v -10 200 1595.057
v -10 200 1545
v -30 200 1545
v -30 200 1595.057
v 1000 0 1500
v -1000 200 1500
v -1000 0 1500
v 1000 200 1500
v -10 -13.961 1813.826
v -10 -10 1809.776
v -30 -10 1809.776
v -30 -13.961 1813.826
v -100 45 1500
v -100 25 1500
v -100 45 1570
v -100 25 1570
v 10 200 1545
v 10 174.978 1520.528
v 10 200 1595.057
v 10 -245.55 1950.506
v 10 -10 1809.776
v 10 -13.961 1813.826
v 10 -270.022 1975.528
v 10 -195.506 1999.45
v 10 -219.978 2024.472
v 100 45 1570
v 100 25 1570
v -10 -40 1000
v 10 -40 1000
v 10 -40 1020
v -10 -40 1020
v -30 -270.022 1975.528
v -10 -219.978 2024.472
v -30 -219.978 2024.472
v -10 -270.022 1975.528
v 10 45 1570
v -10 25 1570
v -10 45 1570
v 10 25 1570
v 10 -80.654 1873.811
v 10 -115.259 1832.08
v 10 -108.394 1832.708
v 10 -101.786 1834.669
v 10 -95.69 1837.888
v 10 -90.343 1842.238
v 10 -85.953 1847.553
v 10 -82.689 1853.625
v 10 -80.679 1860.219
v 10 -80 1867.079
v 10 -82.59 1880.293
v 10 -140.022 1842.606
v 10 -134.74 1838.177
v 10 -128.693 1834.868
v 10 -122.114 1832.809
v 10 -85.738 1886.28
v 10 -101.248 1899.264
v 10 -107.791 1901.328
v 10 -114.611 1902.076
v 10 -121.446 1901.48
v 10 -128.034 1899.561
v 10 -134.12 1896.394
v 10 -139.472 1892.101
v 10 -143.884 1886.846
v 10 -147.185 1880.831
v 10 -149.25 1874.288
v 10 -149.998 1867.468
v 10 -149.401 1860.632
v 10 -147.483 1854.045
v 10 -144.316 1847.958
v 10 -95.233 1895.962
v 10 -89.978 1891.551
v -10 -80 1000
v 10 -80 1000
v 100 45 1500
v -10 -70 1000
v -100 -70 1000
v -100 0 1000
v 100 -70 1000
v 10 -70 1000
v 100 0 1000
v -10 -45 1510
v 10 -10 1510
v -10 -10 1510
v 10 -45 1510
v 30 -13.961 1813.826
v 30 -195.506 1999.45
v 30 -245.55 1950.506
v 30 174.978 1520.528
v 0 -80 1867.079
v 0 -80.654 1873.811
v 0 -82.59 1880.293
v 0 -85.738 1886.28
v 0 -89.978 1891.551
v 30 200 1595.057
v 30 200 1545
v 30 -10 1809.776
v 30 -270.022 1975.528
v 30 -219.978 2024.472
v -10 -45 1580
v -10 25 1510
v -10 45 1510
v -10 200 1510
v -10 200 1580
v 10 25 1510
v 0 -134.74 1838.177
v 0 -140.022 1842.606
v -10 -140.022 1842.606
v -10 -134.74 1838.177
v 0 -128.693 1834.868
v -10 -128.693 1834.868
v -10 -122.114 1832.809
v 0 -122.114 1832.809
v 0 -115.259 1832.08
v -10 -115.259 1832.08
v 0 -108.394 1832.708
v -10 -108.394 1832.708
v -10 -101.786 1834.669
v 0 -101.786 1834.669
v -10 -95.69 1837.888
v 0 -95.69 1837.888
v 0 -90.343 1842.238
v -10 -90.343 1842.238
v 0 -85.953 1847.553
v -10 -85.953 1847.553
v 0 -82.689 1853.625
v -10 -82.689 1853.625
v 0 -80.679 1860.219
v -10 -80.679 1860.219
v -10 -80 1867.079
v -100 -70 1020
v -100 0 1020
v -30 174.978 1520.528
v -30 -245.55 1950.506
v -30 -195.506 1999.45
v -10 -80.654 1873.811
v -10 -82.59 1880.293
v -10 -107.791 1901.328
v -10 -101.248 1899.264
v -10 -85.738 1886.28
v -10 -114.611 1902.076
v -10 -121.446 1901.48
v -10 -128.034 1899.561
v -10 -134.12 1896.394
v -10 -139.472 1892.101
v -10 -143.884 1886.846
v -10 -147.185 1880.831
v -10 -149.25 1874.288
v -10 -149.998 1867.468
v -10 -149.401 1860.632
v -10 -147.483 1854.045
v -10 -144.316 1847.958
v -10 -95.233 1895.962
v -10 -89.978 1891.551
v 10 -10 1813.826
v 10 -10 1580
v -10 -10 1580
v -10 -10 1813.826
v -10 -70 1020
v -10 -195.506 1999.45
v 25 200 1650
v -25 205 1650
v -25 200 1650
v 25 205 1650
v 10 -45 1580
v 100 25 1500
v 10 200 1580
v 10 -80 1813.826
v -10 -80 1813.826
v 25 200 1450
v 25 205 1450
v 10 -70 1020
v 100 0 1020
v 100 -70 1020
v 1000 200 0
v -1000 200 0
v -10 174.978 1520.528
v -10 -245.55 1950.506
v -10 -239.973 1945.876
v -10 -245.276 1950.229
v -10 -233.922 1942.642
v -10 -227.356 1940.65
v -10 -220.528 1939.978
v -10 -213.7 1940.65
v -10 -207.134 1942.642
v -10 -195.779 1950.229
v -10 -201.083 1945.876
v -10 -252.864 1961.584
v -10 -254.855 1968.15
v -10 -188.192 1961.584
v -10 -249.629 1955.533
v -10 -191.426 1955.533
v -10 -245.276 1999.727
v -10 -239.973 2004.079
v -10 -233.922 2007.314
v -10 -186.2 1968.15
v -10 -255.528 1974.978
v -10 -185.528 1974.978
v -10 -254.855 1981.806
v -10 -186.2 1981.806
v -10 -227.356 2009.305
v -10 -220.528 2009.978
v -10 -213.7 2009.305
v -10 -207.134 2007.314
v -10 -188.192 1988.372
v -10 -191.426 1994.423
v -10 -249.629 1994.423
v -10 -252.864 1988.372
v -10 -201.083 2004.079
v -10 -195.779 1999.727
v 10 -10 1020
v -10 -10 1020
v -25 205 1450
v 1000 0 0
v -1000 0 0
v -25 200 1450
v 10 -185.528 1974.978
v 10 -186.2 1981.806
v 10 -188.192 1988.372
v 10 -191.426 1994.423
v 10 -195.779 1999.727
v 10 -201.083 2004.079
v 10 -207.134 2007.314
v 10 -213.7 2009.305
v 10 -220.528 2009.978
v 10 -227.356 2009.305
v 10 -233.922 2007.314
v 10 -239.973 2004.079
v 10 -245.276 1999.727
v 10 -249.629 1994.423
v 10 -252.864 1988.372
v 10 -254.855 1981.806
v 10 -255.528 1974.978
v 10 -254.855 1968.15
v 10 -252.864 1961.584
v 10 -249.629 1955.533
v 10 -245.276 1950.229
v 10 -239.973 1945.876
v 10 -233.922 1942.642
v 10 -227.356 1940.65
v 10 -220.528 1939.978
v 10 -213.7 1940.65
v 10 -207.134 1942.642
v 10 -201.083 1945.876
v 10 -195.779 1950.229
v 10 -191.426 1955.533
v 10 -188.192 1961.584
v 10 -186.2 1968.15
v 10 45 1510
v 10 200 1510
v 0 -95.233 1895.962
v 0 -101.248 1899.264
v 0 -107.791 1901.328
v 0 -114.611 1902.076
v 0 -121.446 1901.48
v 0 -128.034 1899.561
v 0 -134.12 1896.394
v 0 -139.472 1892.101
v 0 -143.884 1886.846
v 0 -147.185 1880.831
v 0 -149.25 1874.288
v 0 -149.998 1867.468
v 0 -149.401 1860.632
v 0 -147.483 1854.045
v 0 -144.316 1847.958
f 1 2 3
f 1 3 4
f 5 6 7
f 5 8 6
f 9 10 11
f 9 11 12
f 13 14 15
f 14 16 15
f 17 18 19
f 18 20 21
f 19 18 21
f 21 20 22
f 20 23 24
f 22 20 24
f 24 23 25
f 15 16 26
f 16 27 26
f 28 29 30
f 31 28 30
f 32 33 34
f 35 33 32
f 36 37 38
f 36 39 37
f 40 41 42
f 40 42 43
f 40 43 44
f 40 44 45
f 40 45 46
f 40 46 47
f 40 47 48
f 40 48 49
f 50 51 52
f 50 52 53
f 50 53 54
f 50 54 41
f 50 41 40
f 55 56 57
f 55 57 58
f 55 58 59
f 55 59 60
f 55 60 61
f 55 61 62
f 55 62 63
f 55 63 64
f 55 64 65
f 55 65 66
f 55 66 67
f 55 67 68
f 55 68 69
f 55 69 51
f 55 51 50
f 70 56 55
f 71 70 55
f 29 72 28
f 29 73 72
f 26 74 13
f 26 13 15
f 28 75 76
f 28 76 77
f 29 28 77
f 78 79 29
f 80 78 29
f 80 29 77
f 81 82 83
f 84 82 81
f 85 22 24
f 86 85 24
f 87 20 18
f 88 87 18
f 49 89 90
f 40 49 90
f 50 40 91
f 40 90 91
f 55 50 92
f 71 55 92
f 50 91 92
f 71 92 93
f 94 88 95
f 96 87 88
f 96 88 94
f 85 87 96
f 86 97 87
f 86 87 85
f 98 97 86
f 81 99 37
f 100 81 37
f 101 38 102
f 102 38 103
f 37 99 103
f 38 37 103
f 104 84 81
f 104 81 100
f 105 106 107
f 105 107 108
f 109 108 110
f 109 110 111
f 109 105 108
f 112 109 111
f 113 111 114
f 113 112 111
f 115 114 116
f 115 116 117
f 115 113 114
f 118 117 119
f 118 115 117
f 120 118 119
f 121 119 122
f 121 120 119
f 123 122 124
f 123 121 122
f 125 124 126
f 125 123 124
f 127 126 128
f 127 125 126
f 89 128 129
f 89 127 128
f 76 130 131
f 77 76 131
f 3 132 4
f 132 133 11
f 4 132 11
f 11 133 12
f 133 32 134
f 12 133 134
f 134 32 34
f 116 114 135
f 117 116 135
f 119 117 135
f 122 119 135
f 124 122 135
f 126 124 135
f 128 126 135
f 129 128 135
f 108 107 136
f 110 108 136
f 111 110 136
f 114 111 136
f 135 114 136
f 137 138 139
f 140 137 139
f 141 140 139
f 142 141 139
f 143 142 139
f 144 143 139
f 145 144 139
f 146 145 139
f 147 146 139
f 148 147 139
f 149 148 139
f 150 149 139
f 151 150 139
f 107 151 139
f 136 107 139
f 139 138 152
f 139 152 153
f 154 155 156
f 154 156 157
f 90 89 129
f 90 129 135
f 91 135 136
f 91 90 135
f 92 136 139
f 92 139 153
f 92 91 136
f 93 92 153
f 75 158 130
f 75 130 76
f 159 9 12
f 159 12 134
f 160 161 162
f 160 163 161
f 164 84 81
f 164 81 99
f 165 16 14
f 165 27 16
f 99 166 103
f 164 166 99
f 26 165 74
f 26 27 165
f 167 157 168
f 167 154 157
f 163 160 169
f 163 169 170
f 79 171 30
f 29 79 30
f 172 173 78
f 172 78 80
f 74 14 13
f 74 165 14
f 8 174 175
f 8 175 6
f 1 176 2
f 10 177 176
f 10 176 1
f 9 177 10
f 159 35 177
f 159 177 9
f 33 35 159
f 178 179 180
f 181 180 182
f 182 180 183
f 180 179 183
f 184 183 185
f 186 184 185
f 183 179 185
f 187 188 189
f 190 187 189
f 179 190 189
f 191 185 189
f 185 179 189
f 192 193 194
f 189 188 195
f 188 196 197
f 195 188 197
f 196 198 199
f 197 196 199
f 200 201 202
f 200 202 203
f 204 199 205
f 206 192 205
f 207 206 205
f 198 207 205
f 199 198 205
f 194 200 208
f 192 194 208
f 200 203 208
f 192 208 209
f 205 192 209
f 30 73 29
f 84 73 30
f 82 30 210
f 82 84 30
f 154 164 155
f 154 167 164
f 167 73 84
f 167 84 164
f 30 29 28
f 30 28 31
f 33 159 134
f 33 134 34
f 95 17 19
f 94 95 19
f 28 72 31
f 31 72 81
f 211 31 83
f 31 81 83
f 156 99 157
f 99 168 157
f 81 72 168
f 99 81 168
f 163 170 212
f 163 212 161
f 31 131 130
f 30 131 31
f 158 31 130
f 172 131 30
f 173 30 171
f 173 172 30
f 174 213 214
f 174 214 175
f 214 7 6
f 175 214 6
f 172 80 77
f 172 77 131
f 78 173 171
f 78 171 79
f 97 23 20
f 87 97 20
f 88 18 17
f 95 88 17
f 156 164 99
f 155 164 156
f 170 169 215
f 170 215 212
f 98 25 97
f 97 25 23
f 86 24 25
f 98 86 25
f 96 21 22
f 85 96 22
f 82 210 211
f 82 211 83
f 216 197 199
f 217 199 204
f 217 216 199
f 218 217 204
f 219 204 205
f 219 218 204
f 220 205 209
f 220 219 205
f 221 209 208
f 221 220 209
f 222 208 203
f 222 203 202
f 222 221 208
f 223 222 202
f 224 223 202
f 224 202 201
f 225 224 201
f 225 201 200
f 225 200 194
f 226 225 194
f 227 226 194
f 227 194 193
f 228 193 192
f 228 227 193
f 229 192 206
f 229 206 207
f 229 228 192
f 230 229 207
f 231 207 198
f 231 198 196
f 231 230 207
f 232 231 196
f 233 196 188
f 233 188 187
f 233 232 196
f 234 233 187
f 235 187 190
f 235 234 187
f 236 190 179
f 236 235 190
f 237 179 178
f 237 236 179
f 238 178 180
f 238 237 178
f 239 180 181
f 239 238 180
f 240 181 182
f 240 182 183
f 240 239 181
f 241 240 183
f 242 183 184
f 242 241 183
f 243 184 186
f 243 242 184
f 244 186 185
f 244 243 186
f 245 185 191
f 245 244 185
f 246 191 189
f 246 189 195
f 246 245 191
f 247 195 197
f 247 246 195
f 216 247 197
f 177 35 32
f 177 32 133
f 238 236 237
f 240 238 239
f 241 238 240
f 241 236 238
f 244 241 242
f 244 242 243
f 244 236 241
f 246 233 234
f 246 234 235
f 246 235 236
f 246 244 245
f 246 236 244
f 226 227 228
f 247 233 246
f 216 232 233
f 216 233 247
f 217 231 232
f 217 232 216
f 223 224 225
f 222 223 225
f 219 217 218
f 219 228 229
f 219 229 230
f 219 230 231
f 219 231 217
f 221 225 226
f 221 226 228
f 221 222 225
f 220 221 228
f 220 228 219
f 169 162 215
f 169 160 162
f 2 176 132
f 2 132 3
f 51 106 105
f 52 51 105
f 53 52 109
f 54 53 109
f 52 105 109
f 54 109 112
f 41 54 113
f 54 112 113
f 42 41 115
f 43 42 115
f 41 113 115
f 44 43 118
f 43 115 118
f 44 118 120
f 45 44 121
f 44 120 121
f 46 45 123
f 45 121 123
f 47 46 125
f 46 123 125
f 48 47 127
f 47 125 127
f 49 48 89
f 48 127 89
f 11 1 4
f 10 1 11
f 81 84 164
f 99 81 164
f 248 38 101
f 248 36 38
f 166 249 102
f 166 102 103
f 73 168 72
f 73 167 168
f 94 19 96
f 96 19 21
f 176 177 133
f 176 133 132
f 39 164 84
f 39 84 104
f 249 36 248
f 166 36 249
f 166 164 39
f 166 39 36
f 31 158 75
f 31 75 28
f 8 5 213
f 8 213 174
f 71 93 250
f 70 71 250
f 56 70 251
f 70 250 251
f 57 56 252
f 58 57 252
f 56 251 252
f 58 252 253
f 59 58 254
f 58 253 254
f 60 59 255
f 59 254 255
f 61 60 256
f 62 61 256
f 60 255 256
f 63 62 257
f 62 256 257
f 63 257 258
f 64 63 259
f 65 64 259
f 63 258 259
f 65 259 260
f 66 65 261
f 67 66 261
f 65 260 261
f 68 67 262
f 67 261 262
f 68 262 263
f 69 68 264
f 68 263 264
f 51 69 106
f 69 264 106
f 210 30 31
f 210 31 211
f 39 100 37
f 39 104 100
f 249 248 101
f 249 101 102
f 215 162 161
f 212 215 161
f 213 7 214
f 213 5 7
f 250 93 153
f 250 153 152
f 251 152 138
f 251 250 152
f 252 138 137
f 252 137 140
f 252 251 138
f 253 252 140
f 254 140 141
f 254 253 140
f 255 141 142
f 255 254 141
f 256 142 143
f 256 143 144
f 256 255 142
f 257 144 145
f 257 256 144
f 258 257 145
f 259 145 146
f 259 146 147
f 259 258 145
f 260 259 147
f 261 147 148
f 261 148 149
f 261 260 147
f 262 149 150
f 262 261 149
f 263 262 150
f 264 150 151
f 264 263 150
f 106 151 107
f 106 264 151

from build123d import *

# Parameters (mm, degrees)
F3_DEPTH  = 1000
F4_START  = 10
F4_DEPTH  = 20
F6_DEPTH  = 10
F7_DEPTH  = 25
F2_W      = 20
F2_H      = 10
F2_W_2    = 35
F2_H_2    = 70
F8_DEPTH  = 10
F2_H_3    = 30
F9_DEPTH  = 100
F2_W_3    = 10
F2_H_4    = 20
F10_DEPTH = 100
F12_DEPTH = 10


with BuildPart() as f3:
    # F1 (on Right) → F3 (new body, symmetric)
    with BuildSketch(Plane.YZ):
        Polygon((0, 1500), (0, 0), (200, 0), (200, 1450), (200, 1500), align=None)
    extrude(amount=F3_DEPTH, both=True)


with BuildPart() as f4:
    # F2 (on Right) → F4 (new body)
    with BuildSketch(Plane.YZ.offset(F4_START)):
        with BuildLine():
            Line((-195.5055843756, 1999.4500660353), (-219.9778212193, 2024.4722407855))
            Line((-219.9778212193, 2024.4722407855), (-244.999999895, 2000.0000001027))
            ThreePointArc((-244.999999895, 2000.0000001027), (-220.138897074, 2009.975660956), (-195.5055843756, 1999.4500660353))
        make_face()
        with BuildLine():
            ThreePointArc((-245.5499385986, 1950.5055810507), (-255.525598915, 1975.3666866098), (-244.999999895, 2000.0000001027))
            Line((-244.999999895, 2000.0000001027), (-270.0221787807, 1975.5277592145))
            Line((-270.0221787807, 1975.5277592145), (-245.5499385986, 1950.5055810507))
        make_face()
        Polygon((-10, 1809.7758168422), (-13.9611338418, 1813.8259649277), (-80, 1813.8259649277), (-80, 1781.2354191128), (-10, 1709.662385405), align=None)
        Polygon((200, 1595.0567157186), (-10, 1809.7758168422), (-10, 1709.662385405), (116.8126626488, 1580), (200, 1580), align=None)
        Polygon((200, 1545), (200, 1580), (116.8126626488, 1580), (174.9778212193, 1520.5277592145), align=None)
        with BuildLine():
            ThreePointArc((-185.5277592145, 1974.9778212193), (-188.1180683847, 1988.1919023572), (-195.5055843756, 1999.4500660353))
            ThreePointArc((-195.5055843756, 1999.4500660353), (-220.138897074, 2009.975660956), (-244.999999895, 2000.0000001027))
            ThreePointArc((-244.999999895, 2000.0000001027), (-255.525598915, 1975.3666866098), (-245.5499385986, 1950.5055810507))
            ThreePointArc((-245.5499385986, 1950.5055810507), (-207.3136810863, 1942.5681291624), (-185.5277592145, 1974.9778212193))
        make_face()
        with BuildLine():
            Line((-89.9778251612, 1891.5508965014), (-195.5055843756, 1999.4500660353))
            ThreePointArc((-195.5055843756, 1999.4500660353), (-188.1180683847, 1988.1919023572), (-185.5277592145, 1974.9778212193))
            ThreePointArc((-185.5277592145, 1974.9778212193), (-207.3136810863, 1942.5681291624), (-245.5499385986, 1950.5055810507))
            Line((-245.5499385986, 1950.5055810507), (-140.0221796625, 1842.6064118015))
            ThreePointArc((-140.0221796625, 1842.6064118015), (-139.47224235, 1892.1008289361), (-89.9778251612, 1891.5508965014))
        make_face()
        with BuildLine():
            ThreePointArc((-80, 1867.0786516854), (-82.5903091703, 1880.2927328233), (-89.9778251612, 1891.5508965014))
            ThreePointArc((-89.9778251612, 1891.5508965014), (-139.47224235, 1892.1008289361), (-140.0221796625, 1842.6064118015))
            ThreePointArc((-140.0221796625, 1842.6064118015), (-101.7859220562, 1834.6689595533), (-80, 1867.0786516854))
        make_face()
        with BuildLine():
            Line((-13.9611338418, 1813.8259649277), (-89.9778251612, 1891.5508965014))
            ThreePointArc((-89.9778251612, 1891.5508965014), (-82.5903091703, 1880.2927328233), (-80, 1867.0786516854))
            ThreePointArc((-80, 1867.0786516854), (-101.7859220562, 1834.6689595533), (-140.0221796625, 1842.6064118015))
            Line((-140.0221796625, 1842.6064118015), (-80, 1781.2354191128))
            Line((-80, 1781.2354191128), (-80, 1813.8259649277))
            Line((-80, 1813.8259649277), (-13.9611338418, 1813.8259649277))
        make_face()
    extrude(amount=F4_DEPTH)


with BuildPart() as f5_1:
    # F5: instance of F4
    add(f4.part.mirror(Plane.YZ))


with BuildPart() as f6:
    # F2 (on Right) → F6 (new body, symmetric)
    with BuildSketch(Plane.YZ):
        Polygon((-10, 1709.662385405), (-80, 1781.2354191128), (-80, 1000), (-70, 1000), (-70, 1020), (-40, 1020), (-10, 1020), (-10, 1510), (-45, 1510), (-45, 1580), (-10, 1580), align=None)
        Polygon((-10, 1809.7758168422), (-13.9611338418, 1813.8259649277), (-80, 1813.8259649277), (-80, 1781.2354191128), (-10, 1709.662385405), align=None)
        Polygon((-70, 1020), (-70, 1000), (-40, 1000), (-40, 1010), (-40, 1020), align=None)
        Polygon((-10, 1813.8259649277), (-13.9611338418, 1813.8259649277), (-10, 1809.7758168422), align=None)
    extrude(amount=F6_DEPTH, both=True)


with BuildPart() as f7:
    # F1 (on Right) → F7 (new body, symmetric)
    with BuildSketch(Plane.YZ):
        Polygon((200, 1650), (200, 1500), (200, 1450), (205, 1450), (205, 1650), align=None)
    extrude(amount=F7_DEPTH, both=True)


with BuildPart() as f8:
    # F2 (on Right) → F8 (new body, symmetric)
    with BuildSketch(Plane.YZ):
        Polygon((174.9778212193, 1520.5277592145), (116.8126626488, 1580), (45, 1580), (45, 1570), (45, 1540), (45, 1510), (200, 1510), (200, 1545), align=None)
        Polygon((200, 1545), (200, 1580), (116.8126626488, 1580), (174.9778212193, 1520.5277592145), align=None)
        Polygon((25, 1580), (-10, 1580), (-10, 1510), (25, 1510), (25, 1540), (25, 1570), align=None)
        with Locations((35, 1575)):
            Rectangle(F2_W, F2_H)
        with Locations((-27.5, 1545)):
            Rectangle(F2_W_2, F2_H_2)
    extrude(amount=F8_DEPTH, both=True)


with BuildPart() as f9:
    # F2 (on Right) → F9 (new body, symmetric)
    with BuildSketch(Plane.YZ):
        with Locations((35, 1505)):
            Rectangle(F2_W, F2_H)
        with Locations((35, 1525)):
            Rectangle(F2_W, F2_H_3)
        with Locations((35, 1555)):
            Rectangle(F2_W, F2_H_3)
    extrude(amount=F9_DEPTH, both=True)

    # F11: cut F8, F6
    add(f8.part, mode=Mode.SUBTRACT)
    add(f6.part, mode=Mode.SUBTRACT)


with BuildPart() as f10:
    # F2 (on Right) → F10 (new body, symmetric)
    with BuildSketch(Plane.YZ):
        Polygon((-70, 1020), (-70, 1000), (-40, 1000), (-40, 1010), (-40, 1020), align=None)
        Polygon((-40, 1010), (-40, 1000), (-10, 1000), (-10, 1020), (-40, 1020), align=None)
        with Locations((-5, 1010)):
            Rectangle(F2_W_3, F2_H_4)
    extrude(amount=F10_DEPTH, both=True)

    # F11: cut F8, F6
    add(f8.part, mode=Mode.SUBTRACT)
    add(f6.part, mode=Mode.SUBTRACT)


with BuildPart() as f12:
    # F2 (on Right) → F12 (new body, symmetric)
    with BuildSketch(Plane.YZ):
        with BuildLine():
            ThreePointArc((-185.5277592145, 1974.9778212193), (-188.1180683847, 1988.1919023572), (-195.5055843756, 1999.4500660353))
            ThreePointArc((-195.5055843756, 1999.4500660353), (-220.138897074, 2009.975660956), (-244.999999895, 2000.0000001027))
            ThreePointArc((-244.999999895, 2000.0000001027), (-255.525598915, 1975.3666866098), (-245.5499385986, 1950.5055810507))
            ThreePointArc((-245.5499385986, 1950.5055810507), (-207.3136810863, 1942.5681291624), (-185.5277592145, 1974.9778212193))
        make_face()
    extrude(amount=F12_DEPTH, both=True)


with BuildPart() as f12b:
    # F2 (on Right) → F12, piece 2 (new body, symmetric)
    with BuildSketch(Plane.YZ):
        with BuildLine():
            ThreePointArc((-80, 1867.0786516854), (-82.5903091703, 1880.2927328233), (-89.9778251612, 1891.5508965014))
            ThreePointArc((-89.9778251612, 1891.5508965014), (-139.47224235, 1892.1008289361), (-140.0221796625, 1842.6064118015))
            ThreePointArc((-140.0221796625, 1842.6064118015), (-101.7859220562, 1834.6689595533), (-80, 1867.0786516854))
        make_face()
    extrude(amount=F12_DEPTH, both=True)


solid = Compound([f3.part, f4.part, f5_1.part, f6.part, f7.part, f8.part, f9.part, f10.part, f12.part, f12b.part])
